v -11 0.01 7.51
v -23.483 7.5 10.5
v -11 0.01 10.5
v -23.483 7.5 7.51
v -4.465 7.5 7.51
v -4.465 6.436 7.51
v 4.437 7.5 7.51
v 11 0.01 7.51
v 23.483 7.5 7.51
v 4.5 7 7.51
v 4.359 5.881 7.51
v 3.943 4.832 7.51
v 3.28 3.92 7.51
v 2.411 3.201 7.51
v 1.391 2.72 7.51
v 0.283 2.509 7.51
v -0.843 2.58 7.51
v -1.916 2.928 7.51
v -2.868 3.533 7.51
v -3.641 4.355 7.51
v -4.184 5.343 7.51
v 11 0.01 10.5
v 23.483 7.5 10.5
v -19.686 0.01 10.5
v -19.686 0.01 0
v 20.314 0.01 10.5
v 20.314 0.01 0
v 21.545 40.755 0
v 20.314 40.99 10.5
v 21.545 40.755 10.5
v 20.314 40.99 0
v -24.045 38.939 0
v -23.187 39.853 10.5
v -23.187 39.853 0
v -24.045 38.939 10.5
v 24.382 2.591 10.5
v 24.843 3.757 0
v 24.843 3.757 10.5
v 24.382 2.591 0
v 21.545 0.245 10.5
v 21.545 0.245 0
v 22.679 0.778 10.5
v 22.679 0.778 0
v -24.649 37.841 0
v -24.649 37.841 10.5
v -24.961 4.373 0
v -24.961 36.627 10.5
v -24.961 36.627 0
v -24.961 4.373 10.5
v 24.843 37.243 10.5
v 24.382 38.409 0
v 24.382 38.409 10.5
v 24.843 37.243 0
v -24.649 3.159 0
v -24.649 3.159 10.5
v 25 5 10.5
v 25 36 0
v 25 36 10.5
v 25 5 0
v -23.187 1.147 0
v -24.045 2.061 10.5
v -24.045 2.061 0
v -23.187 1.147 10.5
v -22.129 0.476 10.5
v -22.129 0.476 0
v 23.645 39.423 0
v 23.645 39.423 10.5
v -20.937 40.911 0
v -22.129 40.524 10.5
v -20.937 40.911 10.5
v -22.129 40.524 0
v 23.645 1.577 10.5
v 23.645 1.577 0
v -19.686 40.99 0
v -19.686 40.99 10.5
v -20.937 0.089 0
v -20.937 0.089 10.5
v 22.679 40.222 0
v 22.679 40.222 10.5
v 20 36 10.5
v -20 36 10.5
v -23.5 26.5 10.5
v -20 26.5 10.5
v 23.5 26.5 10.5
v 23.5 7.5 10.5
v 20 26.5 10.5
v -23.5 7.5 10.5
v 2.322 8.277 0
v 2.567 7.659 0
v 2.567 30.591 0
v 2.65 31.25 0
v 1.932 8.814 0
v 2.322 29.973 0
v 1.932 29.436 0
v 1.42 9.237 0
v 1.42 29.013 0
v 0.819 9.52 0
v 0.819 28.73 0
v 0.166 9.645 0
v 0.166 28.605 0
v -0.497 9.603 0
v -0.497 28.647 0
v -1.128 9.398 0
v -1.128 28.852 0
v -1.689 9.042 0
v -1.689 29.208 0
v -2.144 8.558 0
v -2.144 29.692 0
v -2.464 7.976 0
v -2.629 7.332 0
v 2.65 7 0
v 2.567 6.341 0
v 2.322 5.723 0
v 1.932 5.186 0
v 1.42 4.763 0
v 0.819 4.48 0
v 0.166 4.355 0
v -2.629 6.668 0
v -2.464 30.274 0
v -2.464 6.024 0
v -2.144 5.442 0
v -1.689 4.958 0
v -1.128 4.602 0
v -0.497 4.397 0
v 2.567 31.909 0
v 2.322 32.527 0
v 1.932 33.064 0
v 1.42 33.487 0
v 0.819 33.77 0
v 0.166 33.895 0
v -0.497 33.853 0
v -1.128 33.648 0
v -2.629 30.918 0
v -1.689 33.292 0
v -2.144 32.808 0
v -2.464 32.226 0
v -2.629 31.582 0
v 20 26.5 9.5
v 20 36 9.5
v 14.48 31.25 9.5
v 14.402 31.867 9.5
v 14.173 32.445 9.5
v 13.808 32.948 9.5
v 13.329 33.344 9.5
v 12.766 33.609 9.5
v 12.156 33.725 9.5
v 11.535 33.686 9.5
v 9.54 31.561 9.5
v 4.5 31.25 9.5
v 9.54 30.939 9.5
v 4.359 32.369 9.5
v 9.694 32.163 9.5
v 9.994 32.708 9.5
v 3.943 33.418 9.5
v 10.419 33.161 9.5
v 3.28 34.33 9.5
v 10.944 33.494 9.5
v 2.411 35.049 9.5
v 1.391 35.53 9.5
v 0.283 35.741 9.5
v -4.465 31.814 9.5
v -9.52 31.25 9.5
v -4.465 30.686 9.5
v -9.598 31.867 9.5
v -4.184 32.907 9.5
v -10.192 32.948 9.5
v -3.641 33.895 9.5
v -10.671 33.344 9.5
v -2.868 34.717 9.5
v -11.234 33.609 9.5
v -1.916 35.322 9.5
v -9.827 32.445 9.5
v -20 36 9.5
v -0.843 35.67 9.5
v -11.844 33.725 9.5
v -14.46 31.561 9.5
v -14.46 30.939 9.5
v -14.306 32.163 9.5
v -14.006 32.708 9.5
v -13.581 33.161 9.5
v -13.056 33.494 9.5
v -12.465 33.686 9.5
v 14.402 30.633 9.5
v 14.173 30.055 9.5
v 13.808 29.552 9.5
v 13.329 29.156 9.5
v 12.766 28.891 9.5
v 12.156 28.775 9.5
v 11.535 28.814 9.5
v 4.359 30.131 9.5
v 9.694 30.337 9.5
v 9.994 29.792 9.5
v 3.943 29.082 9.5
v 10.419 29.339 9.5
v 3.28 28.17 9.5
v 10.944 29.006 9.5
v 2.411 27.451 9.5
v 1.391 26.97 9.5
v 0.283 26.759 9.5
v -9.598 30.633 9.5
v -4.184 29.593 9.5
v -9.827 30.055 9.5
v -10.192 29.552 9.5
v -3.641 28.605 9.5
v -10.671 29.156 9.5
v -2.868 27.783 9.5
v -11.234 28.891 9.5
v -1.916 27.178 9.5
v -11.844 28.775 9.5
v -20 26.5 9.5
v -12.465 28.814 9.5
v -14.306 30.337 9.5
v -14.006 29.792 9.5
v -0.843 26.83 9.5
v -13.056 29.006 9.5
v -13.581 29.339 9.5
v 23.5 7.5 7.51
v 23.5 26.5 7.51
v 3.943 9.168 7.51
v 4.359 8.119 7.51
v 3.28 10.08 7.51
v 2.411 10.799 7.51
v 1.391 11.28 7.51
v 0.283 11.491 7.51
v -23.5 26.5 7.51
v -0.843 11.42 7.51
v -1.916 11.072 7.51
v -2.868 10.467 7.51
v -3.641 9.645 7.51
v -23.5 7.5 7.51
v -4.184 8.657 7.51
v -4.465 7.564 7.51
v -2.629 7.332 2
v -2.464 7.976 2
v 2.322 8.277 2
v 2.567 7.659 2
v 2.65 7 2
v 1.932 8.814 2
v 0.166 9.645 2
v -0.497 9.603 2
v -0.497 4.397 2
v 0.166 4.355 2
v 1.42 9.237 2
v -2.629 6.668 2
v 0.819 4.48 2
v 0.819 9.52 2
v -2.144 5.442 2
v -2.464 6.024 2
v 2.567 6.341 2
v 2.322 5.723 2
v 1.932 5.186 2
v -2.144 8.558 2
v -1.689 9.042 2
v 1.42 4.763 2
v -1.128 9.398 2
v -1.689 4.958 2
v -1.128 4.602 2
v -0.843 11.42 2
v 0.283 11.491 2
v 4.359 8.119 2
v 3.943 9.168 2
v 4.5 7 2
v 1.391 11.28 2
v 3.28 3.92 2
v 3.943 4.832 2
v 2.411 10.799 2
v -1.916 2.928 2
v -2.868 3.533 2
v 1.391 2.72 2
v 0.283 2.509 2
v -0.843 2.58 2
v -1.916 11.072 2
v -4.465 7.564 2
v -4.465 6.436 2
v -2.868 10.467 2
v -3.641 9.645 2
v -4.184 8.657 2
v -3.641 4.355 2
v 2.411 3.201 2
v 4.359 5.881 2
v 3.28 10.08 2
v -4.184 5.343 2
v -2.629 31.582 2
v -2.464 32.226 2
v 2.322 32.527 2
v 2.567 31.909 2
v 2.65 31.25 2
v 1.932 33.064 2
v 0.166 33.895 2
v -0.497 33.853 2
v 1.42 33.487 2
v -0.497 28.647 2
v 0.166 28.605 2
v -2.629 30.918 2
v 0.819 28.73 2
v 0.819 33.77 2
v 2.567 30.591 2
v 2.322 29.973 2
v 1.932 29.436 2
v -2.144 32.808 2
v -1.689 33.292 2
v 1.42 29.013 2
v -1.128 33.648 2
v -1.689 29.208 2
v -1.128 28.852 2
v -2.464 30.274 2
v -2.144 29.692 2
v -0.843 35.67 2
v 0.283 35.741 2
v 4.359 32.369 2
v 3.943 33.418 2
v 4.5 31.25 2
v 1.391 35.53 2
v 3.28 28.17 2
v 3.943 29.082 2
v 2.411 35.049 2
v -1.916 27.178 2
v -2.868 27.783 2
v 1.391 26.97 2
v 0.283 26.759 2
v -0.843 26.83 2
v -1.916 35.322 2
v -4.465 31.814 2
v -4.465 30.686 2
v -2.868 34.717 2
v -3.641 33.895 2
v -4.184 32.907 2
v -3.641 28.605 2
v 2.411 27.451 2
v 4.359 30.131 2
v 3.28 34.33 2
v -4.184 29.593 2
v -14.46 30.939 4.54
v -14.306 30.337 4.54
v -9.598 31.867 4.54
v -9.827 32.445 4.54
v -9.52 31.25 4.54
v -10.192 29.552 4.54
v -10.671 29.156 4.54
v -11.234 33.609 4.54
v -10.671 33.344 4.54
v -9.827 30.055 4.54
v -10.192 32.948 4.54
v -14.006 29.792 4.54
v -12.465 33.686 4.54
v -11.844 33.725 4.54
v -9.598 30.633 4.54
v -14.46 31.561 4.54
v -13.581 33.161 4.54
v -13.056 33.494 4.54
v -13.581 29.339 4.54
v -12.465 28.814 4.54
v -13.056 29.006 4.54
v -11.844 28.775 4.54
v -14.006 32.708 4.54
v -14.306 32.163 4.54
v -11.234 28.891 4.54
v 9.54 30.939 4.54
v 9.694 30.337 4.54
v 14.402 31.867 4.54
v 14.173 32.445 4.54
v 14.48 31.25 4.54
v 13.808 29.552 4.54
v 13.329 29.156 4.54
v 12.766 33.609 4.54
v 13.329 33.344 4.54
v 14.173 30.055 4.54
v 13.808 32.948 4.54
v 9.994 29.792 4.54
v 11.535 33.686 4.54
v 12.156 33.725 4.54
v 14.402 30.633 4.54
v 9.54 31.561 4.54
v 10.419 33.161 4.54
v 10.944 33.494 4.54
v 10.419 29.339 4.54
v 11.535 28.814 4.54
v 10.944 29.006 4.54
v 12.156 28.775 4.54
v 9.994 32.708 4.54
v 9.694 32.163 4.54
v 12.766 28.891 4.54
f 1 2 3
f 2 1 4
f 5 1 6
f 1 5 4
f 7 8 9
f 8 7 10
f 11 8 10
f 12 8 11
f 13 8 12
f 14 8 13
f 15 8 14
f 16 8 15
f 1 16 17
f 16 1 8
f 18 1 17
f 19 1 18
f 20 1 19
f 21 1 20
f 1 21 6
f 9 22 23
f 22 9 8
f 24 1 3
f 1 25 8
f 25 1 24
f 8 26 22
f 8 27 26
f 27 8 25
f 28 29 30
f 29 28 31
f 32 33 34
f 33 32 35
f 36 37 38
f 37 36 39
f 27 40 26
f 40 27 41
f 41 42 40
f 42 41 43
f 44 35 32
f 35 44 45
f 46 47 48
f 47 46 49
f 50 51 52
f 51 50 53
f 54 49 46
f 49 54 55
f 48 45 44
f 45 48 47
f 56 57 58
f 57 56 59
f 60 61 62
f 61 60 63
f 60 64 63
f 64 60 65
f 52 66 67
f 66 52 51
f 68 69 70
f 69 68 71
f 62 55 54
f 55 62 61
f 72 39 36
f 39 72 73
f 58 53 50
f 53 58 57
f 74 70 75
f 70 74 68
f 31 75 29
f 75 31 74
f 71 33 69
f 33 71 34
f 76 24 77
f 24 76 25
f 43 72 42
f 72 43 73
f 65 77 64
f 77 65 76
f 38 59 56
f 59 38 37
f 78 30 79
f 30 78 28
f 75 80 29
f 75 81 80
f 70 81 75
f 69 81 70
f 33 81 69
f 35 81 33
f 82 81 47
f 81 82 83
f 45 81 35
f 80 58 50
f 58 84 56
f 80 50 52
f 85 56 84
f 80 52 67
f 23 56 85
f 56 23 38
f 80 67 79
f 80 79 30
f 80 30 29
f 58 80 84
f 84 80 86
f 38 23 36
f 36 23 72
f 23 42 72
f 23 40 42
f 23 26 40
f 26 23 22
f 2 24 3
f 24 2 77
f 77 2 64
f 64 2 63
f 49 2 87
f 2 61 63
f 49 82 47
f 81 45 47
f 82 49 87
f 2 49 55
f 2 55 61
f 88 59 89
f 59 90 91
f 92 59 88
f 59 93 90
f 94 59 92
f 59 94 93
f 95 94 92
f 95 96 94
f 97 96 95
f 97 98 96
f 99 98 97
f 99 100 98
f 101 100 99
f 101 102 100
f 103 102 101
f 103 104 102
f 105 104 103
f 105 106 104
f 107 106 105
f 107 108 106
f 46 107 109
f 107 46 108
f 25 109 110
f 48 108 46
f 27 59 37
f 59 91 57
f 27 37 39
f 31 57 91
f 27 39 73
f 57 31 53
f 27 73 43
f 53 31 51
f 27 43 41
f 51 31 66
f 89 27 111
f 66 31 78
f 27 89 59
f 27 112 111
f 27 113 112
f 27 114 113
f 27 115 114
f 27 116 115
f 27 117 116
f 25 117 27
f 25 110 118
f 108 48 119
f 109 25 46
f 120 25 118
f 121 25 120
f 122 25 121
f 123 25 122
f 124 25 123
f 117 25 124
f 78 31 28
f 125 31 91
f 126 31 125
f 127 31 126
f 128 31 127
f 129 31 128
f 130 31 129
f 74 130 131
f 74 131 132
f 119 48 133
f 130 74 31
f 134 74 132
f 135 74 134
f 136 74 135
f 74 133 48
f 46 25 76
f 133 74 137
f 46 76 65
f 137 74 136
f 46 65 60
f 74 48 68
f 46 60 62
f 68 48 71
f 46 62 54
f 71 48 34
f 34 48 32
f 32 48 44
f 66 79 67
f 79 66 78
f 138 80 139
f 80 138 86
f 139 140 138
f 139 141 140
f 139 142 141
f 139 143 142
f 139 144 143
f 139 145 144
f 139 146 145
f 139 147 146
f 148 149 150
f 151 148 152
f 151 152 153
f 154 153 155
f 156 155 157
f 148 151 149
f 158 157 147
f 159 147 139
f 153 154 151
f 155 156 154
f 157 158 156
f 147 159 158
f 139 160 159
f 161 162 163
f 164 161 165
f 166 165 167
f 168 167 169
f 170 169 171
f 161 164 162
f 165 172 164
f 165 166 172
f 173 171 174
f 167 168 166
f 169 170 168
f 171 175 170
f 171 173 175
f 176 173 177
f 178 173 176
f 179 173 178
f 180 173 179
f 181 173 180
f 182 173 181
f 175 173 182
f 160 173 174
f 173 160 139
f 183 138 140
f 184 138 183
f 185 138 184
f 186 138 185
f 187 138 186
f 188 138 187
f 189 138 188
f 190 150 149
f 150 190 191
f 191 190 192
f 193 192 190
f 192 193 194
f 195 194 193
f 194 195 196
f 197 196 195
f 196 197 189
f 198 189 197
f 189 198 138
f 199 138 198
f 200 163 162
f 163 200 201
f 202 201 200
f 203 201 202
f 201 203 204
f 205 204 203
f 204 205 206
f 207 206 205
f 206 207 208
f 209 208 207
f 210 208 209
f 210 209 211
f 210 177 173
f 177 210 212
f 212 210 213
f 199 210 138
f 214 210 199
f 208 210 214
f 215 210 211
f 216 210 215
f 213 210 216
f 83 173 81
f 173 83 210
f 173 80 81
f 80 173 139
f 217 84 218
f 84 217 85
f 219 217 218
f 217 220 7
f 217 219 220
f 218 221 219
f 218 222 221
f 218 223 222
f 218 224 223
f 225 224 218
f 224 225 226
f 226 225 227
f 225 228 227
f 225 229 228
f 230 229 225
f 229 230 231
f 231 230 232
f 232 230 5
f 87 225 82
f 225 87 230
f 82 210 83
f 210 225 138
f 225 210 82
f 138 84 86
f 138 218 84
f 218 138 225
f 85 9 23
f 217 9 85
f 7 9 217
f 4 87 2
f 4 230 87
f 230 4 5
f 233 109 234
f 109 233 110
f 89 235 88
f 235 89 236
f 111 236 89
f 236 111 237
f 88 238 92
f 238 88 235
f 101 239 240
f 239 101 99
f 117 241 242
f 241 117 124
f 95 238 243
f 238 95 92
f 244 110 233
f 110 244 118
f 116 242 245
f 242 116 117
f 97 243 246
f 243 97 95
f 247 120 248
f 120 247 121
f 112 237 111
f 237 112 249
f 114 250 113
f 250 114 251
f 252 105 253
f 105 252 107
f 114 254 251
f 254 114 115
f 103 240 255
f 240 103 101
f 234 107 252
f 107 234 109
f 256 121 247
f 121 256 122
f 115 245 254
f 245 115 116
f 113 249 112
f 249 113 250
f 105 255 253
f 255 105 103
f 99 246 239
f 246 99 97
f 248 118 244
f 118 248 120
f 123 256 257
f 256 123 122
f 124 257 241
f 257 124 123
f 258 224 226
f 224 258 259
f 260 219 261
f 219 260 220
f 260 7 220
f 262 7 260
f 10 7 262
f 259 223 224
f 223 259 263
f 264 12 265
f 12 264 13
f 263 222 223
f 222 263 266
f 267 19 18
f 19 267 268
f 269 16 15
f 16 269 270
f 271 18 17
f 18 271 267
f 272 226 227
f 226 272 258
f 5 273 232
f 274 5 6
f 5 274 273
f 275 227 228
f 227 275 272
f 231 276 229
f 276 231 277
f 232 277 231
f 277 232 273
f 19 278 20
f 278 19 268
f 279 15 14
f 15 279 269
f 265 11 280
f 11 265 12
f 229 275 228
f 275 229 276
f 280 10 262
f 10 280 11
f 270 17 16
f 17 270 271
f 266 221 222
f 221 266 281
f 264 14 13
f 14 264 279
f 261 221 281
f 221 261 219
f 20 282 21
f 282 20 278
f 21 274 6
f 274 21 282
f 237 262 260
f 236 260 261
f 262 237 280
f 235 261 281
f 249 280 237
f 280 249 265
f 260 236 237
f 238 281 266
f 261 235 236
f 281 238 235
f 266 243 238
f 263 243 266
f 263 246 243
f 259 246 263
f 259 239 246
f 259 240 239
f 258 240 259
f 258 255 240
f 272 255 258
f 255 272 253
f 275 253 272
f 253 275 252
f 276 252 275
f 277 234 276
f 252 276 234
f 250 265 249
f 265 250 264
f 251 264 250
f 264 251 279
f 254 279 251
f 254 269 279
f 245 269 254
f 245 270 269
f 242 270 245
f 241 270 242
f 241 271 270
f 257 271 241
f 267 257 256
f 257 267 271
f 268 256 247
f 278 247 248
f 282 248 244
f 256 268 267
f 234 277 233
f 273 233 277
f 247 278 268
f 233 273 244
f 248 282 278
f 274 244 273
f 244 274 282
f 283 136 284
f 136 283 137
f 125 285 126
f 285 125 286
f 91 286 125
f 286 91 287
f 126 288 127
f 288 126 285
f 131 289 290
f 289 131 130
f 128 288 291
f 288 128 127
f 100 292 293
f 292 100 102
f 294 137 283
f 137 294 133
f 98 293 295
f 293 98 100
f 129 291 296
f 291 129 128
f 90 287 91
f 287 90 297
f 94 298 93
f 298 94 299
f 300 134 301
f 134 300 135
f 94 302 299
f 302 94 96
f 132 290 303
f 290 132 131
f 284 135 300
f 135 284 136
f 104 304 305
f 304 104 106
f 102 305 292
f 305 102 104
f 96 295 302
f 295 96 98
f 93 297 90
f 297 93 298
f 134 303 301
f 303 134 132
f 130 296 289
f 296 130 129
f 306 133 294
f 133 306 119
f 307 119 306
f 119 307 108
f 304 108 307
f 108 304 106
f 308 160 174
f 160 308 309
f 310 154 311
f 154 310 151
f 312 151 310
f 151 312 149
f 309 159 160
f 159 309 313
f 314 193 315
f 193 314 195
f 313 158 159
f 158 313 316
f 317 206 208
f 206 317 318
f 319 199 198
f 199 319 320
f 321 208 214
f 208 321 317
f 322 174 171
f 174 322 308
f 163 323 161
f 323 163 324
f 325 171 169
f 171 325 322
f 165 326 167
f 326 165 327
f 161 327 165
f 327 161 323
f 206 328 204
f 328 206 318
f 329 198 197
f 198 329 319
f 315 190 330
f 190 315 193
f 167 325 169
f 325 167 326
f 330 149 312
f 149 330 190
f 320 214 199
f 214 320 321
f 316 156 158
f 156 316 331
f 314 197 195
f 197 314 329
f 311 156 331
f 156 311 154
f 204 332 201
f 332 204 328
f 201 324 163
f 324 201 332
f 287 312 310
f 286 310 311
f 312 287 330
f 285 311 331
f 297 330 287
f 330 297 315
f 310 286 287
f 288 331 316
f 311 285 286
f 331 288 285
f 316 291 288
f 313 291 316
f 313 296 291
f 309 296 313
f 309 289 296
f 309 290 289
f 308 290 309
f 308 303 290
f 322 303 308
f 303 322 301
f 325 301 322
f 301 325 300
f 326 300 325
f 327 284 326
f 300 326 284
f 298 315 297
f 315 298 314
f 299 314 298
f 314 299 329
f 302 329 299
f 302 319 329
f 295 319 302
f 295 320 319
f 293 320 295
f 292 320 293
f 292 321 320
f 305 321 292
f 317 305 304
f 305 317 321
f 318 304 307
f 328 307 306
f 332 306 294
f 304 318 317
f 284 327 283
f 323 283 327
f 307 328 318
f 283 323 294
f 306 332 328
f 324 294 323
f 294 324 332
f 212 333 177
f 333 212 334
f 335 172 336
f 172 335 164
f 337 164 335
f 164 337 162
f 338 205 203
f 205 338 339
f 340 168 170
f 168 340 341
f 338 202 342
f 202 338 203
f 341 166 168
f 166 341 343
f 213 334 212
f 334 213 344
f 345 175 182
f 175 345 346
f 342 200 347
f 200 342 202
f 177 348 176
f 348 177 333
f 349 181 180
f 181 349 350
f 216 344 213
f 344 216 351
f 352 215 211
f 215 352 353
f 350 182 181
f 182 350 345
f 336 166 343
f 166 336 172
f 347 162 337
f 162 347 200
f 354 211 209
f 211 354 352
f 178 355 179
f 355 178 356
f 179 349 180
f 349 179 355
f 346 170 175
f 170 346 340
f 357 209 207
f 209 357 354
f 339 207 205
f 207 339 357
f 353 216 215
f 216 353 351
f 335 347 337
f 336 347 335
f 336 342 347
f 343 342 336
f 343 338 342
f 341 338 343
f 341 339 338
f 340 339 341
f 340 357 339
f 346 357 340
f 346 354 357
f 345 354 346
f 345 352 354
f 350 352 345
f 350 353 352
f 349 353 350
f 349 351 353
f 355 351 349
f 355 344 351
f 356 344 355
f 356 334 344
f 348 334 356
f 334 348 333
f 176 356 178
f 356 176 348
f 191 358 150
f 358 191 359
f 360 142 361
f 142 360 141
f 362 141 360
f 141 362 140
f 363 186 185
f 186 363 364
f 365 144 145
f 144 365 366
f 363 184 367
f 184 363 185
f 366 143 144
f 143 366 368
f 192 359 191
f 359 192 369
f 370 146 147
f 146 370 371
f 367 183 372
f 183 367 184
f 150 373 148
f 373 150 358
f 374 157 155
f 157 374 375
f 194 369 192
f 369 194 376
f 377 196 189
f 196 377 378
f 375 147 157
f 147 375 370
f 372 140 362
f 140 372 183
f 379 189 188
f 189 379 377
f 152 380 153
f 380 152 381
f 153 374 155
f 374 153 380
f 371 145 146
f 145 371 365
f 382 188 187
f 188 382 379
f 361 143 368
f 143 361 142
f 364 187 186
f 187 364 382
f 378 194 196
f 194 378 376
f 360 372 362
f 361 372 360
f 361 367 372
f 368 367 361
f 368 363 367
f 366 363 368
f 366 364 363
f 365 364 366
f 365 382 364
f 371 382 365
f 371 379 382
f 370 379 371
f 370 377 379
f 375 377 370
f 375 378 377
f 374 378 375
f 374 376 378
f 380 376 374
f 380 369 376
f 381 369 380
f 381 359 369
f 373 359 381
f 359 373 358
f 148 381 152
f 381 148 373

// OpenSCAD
// [FL_INDEX: keywords="openscad, 3d_parametric, Razor_Scraper_Holder__Magnetic, csg_solid" | COT="Parametric OpenSCAD design from 3DCodeverse"]
// Title: Razor Scraper Holder, Magnetic

// Scraper Magnetic Holder

// Magnet Diameter
magnet_diam = 4.76;

// Magenet Length
magnet_len = 4.76;

holder(magnet_diam, magnet_len);

module holder(magnet_diam, magnet_len)
{
	$fn = 25;
	extra = .2;
	screw_lip = 2;

	// Add 1mm to the bottom, and 1mm slot for razor blade
	height = screw_lip + 7.5 + 1;
	width = 50;
	length = 41;

	handle_depth = 3;
	triange_width = sqrt(2) * 47 / 2;
	screw_shaft_r = (5 + extra + .1) / 2;
	screw_head_r = 9 / 2;
	screw1_y = 7;
	screw2_y = length - 9.75;

	difference()
	{
		// Base block
		translate([-width/2,0,0])
			minkowski() {
				cube([width - 10, length - 10, height - .01]);
				translate([5, 5, 0]) cylinder(r = 5, h = .01);
			}
		// Slot for razor blade
		translate([-20, length-15, height - 1]) cube([40, 10, 1.1]);
		// Slot for handle
		translate([-47/2, length - 19 - 14.5, height-handle_depth+.01]) cube([47, 19, handle_depth]);
		// Angled retainer for handle
		translate([0, length - 33.5 + .01, height - handle_depth/2+.01]) scale([1,.6,1])
			difference()
			{
				rotate([0, 0, 45]) cube([triange_width, triange_width, handle_depth], center=true);
				translate([-width/2,0,-height/2]) cube([width, width, height]);
			}
		//translate([0,0,height - handle_depth/2+.01]) cube([26, 10, handle_depth], center=true);

		// Mounting Screws
		translate([0, screw1_y, -.01]) cylinder(h = 2.1, r = screw_shaft_r);
		translate([0, screw1_y, screw_lip]) cylinder(h = height, r = screw_head_r);

		translate([0, screw2_y, -.01]) cylinder(h = 2.1, r = screw_shaft_r);
		translate([0, screw2_y, screw_lip]) cylinder(h = height, r = screw_head_r);

		// Magnet holes
		translate([-12, screw2_y, height - magnet_len - 1 - extra]) cylinder(h = magnet_len + 1, r = magnet_diam / 2 + extra/2);
		translate([12, screw2_y, height - magnet_len - 1 - extra]) cylinder(h = magnet_len + 1, r = magnet_diam / 2 + extra/2);
	}
}
